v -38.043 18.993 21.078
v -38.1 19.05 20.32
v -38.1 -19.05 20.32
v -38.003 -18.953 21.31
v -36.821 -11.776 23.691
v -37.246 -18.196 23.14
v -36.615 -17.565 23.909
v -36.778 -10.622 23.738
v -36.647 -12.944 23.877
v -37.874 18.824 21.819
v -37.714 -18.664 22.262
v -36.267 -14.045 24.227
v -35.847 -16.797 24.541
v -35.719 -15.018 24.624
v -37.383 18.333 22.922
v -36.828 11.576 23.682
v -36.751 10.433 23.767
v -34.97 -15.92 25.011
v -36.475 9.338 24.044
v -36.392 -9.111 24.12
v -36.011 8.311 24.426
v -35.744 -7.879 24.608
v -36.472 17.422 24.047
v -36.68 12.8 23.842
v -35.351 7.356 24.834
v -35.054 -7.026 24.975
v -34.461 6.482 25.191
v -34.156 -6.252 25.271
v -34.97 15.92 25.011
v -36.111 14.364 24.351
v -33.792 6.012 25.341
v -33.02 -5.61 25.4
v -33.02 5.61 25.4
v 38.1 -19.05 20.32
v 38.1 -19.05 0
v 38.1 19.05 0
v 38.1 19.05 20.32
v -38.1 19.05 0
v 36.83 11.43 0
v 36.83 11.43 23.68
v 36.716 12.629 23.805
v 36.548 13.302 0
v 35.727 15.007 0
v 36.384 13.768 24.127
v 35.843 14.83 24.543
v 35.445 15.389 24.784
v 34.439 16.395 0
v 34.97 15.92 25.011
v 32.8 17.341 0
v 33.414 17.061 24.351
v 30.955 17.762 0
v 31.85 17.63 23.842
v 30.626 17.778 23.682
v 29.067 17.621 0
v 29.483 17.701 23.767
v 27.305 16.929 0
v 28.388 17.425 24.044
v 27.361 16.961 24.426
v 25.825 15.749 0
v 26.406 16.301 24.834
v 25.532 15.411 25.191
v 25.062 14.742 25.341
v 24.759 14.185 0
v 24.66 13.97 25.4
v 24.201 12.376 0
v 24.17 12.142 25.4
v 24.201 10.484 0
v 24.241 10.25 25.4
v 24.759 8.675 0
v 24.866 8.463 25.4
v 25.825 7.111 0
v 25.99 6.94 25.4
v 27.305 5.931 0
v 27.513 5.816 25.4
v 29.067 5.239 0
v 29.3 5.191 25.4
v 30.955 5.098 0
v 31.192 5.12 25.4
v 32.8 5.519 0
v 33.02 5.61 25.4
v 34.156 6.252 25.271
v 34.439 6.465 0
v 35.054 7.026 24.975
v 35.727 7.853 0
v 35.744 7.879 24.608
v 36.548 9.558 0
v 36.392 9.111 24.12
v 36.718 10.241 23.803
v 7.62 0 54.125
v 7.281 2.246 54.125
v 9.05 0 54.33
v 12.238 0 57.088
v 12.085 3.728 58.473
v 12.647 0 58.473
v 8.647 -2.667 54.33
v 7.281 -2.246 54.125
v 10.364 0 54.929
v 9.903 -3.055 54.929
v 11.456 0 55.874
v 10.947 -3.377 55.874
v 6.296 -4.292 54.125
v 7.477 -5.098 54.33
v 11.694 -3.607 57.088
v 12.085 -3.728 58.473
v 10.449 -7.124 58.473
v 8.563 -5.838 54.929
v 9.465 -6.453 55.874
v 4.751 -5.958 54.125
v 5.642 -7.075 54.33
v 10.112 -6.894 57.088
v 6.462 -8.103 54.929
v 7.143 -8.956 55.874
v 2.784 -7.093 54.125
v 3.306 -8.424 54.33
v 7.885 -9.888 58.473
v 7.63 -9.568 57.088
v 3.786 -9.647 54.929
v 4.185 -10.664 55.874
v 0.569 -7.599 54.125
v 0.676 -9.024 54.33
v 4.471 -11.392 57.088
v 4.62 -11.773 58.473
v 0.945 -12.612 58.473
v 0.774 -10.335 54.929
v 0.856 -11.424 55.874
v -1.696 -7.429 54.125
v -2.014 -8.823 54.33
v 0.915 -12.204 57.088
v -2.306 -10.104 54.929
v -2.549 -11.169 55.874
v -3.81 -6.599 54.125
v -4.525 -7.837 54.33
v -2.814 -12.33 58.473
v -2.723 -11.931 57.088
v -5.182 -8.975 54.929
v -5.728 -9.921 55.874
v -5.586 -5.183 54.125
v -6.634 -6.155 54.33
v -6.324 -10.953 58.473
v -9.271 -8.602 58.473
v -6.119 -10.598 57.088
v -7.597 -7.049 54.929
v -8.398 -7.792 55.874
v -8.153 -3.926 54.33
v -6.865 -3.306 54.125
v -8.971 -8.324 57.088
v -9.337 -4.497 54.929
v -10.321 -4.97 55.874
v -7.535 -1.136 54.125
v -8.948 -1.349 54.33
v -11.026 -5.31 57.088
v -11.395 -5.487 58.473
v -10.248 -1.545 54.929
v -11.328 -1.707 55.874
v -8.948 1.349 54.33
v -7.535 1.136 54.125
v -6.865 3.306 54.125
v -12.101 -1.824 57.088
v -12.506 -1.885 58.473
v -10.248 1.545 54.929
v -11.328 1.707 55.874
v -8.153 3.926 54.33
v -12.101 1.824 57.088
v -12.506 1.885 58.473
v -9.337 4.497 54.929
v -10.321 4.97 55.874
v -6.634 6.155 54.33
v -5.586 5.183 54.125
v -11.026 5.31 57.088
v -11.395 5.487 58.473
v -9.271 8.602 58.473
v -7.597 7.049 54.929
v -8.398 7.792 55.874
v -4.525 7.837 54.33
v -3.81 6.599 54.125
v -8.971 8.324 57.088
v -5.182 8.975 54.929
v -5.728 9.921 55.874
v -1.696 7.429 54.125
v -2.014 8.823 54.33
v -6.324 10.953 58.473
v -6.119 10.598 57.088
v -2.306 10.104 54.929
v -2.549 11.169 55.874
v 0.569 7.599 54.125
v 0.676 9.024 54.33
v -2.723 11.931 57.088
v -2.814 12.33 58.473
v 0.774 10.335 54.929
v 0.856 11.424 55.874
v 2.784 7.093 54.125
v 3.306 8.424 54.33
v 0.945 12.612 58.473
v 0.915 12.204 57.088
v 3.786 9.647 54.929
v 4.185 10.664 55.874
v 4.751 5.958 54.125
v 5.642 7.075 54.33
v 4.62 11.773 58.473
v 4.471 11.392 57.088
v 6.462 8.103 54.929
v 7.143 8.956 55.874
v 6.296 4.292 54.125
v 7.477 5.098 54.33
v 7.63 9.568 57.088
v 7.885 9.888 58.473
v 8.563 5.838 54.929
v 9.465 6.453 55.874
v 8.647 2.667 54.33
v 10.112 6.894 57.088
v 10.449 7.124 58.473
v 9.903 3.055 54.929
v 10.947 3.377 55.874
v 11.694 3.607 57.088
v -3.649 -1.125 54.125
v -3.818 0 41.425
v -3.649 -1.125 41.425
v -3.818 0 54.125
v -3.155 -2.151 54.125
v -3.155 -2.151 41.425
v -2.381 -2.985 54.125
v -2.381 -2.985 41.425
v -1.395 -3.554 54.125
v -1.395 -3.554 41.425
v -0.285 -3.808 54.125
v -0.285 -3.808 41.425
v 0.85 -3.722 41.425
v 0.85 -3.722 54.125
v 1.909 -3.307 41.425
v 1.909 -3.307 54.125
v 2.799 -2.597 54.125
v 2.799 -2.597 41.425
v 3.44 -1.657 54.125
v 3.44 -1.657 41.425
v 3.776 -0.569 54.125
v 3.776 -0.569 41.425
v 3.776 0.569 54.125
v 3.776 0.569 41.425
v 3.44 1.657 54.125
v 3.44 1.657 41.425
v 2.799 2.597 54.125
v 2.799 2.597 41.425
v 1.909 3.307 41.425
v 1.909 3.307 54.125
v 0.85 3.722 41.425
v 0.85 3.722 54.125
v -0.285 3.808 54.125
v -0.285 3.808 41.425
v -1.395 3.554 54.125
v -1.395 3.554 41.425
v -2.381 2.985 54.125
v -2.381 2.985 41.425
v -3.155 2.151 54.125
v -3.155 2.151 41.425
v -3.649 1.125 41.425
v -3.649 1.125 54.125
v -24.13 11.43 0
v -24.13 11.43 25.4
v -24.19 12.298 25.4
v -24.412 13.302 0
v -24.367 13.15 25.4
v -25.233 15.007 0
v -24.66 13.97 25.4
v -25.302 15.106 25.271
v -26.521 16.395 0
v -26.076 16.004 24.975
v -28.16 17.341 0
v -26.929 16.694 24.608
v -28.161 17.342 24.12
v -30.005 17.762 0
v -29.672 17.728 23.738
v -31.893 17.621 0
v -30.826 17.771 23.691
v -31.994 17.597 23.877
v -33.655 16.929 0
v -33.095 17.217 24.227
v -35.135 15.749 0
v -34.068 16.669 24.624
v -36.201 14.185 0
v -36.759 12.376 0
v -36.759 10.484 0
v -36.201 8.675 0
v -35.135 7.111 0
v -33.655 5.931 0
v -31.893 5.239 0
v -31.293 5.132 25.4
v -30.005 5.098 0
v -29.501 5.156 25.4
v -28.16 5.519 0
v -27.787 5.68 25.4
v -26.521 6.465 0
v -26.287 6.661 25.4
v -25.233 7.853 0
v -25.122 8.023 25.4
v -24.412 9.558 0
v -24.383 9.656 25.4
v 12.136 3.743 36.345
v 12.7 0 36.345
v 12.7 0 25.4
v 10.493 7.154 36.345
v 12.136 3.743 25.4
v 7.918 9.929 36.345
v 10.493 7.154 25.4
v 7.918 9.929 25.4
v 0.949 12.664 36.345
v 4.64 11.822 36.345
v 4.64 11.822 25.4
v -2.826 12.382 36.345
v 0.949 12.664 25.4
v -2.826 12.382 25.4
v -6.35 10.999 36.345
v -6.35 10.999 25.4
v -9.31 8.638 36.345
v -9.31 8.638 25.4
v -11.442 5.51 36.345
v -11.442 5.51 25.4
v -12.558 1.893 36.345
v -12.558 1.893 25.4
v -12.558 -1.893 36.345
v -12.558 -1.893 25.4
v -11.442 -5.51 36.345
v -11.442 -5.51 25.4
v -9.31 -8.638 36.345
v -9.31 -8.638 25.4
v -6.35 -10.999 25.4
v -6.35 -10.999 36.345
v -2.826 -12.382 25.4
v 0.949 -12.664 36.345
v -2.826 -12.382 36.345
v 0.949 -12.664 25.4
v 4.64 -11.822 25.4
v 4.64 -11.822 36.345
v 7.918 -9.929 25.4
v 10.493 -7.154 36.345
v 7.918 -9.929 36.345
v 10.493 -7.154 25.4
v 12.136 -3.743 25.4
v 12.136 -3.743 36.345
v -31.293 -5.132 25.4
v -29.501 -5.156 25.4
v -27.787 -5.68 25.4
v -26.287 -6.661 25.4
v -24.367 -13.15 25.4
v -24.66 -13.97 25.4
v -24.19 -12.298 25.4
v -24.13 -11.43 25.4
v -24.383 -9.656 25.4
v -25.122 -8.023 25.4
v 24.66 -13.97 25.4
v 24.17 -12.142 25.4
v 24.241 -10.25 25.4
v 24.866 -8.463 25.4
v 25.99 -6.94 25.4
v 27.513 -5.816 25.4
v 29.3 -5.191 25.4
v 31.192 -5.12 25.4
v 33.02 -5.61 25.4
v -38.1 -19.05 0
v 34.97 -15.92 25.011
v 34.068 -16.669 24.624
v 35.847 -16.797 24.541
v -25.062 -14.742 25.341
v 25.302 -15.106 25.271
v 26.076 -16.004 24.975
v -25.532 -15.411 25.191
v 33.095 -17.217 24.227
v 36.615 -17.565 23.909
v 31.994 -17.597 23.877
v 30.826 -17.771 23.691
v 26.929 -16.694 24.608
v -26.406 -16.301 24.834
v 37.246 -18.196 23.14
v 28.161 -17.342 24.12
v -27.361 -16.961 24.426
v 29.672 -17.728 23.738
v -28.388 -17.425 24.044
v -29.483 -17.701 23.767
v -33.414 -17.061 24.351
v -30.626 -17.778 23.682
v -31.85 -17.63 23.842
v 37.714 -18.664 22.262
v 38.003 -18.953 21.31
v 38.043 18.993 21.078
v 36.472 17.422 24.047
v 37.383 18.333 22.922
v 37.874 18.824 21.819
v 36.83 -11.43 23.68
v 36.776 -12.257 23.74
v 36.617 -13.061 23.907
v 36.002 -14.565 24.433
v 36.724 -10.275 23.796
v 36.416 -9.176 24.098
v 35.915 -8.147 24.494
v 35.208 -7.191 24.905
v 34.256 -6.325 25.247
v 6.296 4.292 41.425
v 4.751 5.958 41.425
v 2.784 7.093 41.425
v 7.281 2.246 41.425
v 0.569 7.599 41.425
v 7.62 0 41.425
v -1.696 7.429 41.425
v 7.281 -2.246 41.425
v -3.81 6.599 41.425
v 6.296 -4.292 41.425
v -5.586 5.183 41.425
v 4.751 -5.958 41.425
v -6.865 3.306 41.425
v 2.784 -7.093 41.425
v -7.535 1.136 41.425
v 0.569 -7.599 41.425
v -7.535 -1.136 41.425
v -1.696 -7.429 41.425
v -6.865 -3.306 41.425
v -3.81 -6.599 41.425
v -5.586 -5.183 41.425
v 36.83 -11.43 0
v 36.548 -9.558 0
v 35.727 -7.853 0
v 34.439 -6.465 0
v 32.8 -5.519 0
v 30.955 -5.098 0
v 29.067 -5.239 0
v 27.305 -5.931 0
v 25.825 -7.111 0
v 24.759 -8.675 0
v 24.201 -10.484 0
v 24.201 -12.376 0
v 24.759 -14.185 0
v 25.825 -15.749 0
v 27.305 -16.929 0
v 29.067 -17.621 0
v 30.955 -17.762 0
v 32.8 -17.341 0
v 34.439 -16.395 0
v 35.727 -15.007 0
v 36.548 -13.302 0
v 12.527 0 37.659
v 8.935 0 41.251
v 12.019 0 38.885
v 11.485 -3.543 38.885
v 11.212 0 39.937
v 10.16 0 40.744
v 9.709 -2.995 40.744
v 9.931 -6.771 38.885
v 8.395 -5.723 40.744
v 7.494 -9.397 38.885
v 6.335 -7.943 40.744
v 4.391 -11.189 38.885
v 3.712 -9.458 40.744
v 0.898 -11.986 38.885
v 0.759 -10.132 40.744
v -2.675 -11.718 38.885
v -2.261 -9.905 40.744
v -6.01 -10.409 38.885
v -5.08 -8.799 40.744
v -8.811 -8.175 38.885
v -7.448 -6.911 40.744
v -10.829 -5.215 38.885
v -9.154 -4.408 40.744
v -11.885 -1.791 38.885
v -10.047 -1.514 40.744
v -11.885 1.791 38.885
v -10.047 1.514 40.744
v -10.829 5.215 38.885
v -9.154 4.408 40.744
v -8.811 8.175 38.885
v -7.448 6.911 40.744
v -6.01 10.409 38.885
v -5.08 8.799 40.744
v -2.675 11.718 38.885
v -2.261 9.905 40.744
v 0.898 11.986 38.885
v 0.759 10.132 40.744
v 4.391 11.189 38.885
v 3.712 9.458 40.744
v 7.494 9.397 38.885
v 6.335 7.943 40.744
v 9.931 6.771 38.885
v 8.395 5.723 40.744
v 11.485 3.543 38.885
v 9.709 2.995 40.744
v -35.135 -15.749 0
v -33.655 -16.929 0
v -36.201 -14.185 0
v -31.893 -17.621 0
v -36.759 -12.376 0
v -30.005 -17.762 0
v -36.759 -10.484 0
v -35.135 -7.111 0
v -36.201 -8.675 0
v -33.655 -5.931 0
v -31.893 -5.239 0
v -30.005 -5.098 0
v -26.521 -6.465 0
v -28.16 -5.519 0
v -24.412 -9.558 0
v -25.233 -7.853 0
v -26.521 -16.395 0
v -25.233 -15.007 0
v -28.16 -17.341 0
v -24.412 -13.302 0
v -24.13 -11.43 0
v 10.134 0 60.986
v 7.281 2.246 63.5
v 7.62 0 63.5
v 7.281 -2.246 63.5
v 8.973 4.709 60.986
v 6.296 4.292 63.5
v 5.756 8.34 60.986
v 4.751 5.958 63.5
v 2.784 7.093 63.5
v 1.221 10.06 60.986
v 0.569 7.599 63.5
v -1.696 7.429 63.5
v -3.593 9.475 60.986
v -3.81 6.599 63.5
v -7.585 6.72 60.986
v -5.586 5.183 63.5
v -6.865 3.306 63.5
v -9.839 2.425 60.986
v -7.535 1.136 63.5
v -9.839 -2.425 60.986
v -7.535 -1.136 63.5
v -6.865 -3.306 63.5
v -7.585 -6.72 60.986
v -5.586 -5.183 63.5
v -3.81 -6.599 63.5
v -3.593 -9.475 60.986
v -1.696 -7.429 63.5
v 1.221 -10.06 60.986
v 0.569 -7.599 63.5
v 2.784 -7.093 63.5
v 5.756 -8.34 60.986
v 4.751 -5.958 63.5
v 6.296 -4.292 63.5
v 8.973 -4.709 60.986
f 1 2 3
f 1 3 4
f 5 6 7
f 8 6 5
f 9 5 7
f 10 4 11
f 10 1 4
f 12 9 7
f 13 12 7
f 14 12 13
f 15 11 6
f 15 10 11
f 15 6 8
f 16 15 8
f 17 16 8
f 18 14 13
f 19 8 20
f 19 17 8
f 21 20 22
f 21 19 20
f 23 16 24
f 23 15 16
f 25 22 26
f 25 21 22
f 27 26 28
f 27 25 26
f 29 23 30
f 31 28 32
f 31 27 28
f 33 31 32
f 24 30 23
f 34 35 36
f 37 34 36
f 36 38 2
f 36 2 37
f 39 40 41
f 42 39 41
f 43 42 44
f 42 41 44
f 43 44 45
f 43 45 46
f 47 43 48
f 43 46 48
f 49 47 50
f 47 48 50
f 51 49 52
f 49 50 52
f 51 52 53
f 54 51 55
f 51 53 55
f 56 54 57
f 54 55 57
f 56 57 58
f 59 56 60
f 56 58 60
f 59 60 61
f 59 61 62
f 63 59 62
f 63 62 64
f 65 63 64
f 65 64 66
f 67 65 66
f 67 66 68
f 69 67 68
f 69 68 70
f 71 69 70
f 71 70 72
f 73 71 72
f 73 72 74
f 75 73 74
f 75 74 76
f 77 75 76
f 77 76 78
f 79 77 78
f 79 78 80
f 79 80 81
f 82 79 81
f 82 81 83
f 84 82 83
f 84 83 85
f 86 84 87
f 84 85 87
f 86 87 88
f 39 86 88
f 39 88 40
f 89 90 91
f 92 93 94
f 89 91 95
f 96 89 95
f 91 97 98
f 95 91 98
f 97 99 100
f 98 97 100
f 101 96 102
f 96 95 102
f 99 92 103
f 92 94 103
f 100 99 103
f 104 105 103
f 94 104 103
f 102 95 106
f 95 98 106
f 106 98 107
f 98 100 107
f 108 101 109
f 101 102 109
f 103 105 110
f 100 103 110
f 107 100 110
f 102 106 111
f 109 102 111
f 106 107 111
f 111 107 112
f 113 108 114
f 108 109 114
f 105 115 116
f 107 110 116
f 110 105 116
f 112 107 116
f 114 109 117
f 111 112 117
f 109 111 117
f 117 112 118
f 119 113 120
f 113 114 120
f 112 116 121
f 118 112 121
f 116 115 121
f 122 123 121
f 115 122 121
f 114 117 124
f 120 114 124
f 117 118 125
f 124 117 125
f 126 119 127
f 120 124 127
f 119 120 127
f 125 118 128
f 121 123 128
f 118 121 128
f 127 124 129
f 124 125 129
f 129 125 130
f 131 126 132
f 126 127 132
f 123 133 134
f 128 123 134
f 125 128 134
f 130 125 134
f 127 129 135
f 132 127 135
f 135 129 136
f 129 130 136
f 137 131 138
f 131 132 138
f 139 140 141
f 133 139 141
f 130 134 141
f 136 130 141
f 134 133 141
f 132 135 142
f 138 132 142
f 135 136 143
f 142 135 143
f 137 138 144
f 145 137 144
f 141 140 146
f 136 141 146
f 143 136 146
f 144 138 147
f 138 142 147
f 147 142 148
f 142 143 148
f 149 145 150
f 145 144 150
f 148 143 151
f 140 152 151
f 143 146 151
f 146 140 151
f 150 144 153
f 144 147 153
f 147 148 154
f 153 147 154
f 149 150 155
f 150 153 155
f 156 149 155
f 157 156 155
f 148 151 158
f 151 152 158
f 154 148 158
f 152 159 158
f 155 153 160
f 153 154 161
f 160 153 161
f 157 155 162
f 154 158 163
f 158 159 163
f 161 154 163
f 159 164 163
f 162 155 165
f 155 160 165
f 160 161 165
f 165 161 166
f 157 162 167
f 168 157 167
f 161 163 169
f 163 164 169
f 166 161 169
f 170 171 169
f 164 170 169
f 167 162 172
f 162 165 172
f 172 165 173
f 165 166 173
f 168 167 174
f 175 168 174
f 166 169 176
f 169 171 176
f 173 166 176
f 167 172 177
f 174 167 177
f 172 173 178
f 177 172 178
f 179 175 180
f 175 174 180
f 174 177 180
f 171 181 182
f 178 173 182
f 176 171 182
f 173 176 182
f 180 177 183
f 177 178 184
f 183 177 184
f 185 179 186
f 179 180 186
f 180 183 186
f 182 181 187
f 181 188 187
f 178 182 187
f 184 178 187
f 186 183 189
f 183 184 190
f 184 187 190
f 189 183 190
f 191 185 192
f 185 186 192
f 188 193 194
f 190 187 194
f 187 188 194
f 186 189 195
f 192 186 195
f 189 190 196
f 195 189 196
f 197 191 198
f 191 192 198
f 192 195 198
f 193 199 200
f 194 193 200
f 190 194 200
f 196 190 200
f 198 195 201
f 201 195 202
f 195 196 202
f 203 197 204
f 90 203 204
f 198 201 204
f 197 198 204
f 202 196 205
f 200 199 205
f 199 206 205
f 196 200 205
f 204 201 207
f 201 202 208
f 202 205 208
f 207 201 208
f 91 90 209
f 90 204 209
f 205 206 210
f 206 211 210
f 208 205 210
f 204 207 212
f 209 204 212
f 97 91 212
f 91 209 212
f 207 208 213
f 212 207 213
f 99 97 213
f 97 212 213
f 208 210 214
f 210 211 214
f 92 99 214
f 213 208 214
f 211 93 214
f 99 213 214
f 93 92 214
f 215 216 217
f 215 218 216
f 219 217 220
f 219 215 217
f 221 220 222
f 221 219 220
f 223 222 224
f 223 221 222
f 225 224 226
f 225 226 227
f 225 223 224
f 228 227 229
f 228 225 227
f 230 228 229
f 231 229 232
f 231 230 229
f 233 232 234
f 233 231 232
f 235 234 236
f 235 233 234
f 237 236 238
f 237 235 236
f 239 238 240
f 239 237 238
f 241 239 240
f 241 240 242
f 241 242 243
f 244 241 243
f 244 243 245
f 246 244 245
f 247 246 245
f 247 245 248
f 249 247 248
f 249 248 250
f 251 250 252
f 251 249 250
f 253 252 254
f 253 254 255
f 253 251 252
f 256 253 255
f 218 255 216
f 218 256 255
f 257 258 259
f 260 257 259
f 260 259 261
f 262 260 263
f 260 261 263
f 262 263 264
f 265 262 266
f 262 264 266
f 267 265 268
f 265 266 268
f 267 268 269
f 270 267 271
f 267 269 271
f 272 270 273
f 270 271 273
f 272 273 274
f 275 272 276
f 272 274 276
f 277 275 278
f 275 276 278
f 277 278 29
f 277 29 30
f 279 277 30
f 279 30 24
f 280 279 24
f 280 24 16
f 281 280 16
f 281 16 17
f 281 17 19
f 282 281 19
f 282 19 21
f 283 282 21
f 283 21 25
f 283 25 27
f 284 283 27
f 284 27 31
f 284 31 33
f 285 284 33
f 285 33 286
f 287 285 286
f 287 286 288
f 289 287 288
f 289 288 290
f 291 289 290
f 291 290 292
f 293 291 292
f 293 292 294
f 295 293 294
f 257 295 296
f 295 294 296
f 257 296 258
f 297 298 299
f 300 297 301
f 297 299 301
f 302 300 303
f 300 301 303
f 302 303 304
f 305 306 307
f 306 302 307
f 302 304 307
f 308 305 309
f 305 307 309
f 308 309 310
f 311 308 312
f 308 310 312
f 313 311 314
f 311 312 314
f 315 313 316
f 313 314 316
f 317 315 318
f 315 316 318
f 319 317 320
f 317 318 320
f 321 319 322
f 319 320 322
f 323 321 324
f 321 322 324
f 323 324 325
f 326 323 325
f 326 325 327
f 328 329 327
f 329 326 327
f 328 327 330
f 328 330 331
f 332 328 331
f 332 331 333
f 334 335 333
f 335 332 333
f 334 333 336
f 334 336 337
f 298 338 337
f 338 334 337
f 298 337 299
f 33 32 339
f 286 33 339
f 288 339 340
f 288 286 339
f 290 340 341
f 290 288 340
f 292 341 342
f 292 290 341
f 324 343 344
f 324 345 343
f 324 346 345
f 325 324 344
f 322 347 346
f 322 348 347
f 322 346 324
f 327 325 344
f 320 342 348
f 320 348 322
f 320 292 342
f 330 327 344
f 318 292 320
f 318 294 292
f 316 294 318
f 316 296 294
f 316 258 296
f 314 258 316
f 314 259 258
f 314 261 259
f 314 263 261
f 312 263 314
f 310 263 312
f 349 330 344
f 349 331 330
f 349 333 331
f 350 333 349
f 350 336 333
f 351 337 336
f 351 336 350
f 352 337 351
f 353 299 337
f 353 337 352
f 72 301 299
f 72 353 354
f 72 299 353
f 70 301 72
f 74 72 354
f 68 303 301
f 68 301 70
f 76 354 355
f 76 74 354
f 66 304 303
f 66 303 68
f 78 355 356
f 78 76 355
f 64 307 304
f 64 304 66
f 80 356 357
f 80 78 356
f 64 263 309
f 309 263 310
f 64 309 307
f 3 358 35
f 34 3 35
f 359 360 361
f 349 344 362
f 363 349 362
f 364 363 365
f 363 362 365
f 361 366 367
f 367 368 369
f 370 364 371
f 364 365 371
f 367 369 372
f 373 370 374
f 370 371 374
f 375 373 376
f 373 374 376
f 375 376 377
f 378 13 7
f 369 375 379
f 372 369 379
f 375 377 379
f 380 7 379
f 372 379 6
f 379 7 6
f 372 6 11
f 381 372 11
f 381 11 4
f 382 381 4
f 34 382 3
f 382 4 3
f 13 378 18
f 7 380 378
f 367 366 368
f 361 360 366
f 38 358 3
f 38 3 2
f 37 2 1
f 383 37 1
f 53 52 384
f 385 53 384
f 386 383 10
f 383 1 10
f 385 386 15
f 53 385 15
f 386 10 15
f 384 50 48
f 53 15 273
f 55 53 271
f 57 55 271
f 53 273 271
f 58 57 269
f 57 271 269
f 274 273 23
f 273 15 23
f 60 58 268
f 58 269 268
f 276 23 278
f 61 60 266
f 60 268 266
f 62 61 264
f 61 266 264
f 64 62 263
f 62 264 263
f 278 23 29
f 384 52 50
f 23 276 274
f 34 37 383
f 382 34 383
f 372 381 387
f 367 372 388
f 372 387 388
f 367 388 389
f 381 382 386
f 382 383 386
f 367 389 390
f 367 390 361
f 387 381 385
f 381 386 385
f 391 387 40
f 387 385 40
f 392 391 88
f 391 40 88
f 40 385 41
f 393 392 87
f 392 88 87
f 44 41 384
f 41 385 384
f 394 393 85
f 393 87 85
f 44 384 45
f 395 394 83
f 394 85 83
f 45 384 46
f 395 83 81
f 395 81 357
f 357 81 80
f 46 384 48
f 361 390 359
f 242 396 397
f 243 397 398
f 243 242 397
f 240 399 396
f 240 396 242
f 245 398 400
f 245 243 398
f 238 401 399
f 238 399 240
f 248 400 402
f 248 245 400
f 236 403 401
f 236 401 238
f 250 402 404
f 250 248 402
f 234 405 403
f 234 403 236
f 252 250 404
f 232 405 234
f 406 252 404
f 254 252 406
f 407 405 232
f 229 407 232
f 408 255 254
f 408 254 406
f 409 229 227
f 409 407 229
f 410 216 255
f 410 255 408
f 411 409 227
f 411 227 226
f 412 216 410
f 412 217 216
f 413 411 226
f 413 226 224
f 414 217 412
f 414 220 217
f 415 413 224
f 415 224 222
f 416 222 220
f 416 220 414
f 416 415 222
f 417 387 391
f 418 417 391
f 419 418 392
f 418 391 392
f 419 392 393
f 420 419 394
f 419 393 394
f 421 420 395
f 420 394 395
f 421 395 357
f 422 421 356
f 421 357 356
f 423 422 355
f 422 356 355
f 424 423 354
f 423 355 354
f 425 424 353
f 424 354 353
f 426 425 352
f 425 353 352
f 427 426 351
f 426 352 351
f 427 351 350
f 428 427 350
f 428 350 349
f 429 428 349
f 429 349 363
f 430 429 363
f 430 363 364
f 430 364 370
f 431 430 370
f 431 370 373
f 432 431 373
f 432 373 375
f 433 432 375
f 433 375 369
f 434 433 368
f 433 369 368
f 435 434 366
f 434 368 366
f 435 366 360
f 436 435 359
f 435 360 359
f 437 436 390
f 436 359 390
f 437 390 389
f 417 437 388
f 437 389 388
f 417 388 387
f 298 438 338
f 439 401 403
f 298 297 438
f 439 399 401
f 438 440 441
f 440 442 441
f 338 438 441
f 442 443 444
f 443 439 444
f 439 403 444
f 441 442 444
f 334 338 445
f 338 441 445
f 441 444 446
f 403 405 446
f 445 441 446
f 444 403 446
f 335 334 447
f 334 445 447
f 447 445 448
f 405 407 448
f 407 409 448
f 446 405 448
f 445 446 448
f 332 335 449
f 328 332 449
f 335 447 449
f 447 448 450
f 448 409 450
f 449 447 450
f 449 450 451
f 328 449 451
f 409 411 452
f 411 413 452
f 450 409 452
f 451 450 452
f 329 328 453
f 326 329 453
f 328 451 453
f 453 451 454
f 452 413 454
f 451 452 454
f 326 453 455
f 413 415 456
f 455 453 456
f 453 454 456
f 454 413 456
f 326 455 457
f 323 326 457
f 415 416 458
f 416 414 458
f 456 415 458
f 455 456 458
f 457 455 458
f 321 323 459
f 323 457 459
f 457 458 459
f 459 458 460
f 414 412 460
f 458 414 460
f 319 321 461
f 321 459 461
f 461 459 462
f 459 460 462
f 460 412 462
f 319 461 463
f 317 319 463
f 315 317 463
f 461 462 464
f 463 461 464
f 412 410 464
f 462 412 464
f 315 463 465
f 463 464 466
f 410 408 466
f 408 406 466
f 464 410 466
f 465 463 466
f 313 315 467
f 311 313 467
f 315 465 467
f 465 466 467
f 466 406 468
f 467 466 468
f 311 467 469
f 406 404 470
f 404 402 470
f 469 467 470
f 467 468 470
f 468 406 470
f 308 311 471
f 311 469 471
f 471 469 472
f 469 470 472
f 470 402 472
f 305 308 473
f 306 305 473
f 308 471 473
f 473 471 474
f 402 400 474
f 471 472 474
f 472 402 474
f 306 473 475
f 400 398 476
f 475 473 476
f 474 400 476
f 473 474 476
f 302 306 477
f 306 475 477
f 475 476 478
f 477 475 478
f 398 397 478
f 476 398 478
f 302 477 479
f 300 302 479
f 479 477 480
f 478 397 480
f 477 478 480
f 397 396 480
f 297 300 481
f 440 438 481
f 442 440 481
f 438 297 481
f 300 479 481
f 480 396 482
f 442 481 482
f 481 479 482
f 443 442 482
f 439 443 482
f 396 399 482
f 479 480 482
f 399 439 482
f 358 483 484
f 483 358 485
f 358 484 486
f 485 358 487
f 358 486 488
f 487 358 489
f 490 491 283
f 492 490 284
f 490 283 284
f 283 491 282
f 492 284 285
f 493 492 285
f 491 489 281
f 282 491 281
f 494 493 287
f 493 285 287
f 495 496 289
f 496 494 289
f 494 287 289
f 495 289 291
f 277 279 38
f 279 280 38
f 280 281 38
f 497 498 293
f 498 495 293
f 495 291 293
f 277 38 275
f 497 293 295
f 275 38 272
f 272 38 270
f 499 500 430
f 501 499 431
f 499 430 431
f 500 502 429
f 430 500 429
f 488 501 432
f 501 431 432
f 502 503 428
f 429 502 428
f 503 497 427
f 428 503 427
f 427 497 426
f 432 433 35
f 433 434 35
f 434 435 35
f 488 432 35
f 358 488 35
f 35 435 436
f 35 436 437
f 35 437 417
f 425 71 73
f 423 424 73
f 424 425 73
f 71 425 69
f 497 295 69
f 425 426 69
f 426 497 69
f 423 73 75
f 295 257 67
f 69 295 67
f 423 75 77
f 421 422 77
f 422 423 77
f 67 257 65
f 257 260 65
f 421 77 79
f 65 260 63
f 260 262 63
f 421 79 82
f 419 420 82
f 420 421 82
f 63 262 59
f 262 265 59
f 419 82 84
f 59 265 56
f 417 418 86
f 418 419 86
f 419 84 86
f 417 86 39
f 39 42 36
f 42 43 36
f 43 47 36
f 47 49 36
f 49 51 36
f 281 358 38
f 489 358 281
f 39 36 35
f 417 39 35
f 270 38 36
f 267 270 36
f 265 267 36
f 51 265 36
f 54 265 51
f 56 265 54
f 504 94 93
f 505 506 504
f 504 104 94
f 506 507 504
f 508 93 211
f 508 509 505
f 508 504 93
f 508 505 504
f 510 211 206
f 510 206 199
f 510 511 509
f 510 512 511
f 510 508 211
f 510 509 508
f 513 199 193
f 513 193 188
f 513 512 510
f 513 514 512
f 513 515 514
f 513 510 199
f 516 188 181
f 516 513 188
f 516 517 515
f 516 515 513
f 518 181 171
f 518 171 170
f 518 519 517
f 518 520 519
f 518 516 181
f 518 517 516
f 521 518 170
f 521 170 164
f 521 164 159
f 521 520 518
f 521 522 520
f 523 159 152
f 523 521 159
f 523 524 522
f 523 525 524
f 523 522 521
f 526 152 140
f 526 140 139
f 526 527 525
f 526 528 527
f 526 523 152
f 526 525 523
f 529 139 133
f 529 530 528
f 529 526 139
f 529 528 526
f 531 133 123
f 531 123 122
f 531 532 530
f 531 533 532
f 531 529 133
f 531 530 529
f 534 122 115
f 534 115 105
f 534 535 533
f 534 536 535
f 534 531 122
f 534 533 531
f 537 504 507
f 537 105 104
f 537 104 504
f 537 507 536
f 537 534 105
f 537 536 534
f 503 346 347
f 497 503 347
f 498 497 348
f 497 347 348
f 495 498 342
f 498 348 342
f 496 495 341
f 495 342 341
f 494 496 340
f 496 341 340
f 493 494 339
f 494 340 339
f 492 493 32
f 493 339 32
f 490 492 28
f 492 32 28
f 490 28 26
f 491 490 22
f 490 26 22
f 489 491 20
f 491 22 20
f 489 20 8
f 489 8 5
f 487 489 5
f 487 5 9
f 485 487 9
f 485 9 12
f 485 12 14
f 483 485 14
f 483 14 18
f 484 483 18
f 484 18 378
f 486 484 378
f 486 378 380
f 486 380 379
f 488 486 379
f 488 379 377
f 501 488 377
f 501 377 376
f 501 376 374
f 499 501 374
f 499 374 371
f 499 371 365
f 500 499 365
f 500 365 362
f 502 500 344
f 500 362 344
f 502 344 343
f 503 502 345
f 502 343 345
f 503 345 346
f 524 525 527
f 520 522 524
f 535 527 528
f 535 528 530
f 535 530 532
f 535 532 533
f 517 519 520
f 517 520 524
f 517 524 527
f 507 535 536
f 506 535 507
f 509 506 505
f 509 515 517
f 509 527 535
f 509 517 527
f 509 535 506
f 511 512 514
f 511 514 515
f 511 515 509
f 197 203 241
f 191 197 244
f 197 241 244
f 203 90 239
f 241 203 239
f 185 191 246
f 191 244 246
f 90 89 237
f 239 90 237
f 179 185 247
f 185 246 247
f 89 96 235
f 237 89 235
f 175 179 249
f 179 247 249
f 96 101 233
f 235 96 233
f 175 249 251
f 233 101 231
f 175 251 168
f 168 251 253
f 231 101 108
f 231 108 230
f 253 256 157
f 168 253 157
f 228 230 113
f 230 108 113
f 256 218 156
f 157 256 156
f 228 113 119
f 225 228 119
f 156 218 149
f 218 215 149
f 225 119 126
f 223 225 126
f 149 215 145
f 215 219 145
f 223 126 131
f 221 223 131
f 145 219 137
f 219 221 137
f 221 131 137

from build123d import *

# Parameters (mm, degrees)
F0_W        = 76.2
F0_H        = 38.1
F1_DEPTH    = 25.4
F2_R        = 6.35
F3_DEPTH    = 25.4
F4_R        = 12.7
F5_DEPTH    = 38.1
F6_W        = 12.7
F6_H        = 12.7
F8_T1_DEPTH = 101.6
F8_T3_DEPTH = 63.5


# Not quite as in the source:
# - a fillet or chamfer that OpenCascade refuses, or shapes differently, is made with other operations: its cross-section is extruded or revolved along the edge and cut away or added


with BuildPart() as f1:
    # F0 (on Top) → F1 (new body)
    with BuildSketch(Plane.XY):
        Rectangle(F0_W, F0_H)
    extrude(amount=F1_DEPTH)

    # F2 (on face) → F3 (cut)
    with BuildSketch(Plane.XY.offset(25.4)):
        with Locations((-30.48, 11.43)):
            Circle(F2_R)
        with Locations((-30.48, -11.43)):
            Circle(F2_R)
        with Locations((30.48, 11.43)):
            Circle(F2_R)
        with Locations((30.48, -11.43)):
            Circle(F2_R)
    extrude(amount=-F3_DEPTH, mode=Mode.SUBTRACT)

    # F4 (on face) → F5 (join)
    with BuildSketch(Plane.XY.offset(25.4)):
        Circle(F4_R)
    extrude(amount=F5_DEPTH)

    # F6 (on Front) → F7 (revolve, cut)
    with BuildSketch(Plane.XZ):
        with Locations((-10.1681923658, 47.7745333523)):
            Rectangle(F6_W, F6_H)
    revolve(axis=Axis((0, 0, 63.5), (0, 0, 1)), mode=Mode.SUBTRACT)

    # F8: fillet of radius 5.08 on 6 edges, made by hand

    # F8_s2 → F8_t1 (cut)
    with BuildSketch(Plane.YZ.offset(-50.8)):
        with BuildLine():
            ThreePointArc((-13.97, 25.4), (-17.5621024484, 23.9121024484), (-19.05, 20.32))
            Line((-19.05, 20.32), (-19.05, 25.4))
            Line((-19.05, 25.4), (-13.97, 25.4))
        make_face()
        with BuildLine():
            ThreePointArc((19.05, 20.32), (17.5621024484, 23.9121024484), (13.97, 25.4))
            Line((13.97, 25.4), (19.05, 25.4))
            Line((19.05, 25.4), (19.05, 20.32))
        make_face()
    extrude(amount=F8_T1_DEPTH, mode=Mode.SUBTRACT)

    # F8_s4 → F8_t3 (cut)
    with BuildSketch(Plane.XZ.offset(-31.75)):
        with BuildLine():
            ThreePointArc((-38.1, 20.32), (-36.6121024484, 23.9121024484), (-33.02, 25.4))
            Line((-33.02, 25.4), (-38.1, 25.4))
            Line((-38.1, 25.4), (-38.1, 20.32))
        make_face()
        with BuildLine():
            ThreePointArc((38.1, 20.32), (36.6121024484, 23.9121024484), (33.02, 25.4))
            Line((33.02, 25.4), (38.1, 25.4))
            Line((38.1, 25.4), (38.1, 20.32))
        make_face()
    extrude(amount=F8_T3_DEPTH, mode=Mode.SUBTRACT)

    # F8_s5 → F8_t6 (revolve, cut)
    with BuildSketch(Plane.XZ):
        with BuildLine():
            ThreePointArc((12.7, 36.3445333523), (11.2121024484, 39.9366358007), (7.62, 41.4245333523))
            Line((7.62, 41.4245333523), (12.7, 41.4245333523))
            Line((12.7, 41.4245333523), (12.7, 36.3445333523))
        make_face()
    revolve(axis=Axis((0, 0, 41.4245333523), (0, 0, -1)), mode=Mode.SUBTRACT)

    # F8_s7 → F8_t8 (revolve, cut)
    with BuildSketch(Plane.XZ):
        with BuildLine():
            ThreePointArc((7.62, 54.1245333523), (11.2121024484, 55.6124309038), (12.7, 59.2045333523))
            Line((12.7, 59.2045333523), (12.7, 54.1245333523))
            Line((12.7, 54.1245333523), (7.62, 54.1245333523))
        make_face()
    revolve(axis=Axis((0, 0, 54.1245333523), (0, 0, -1)), mode=Mode.SUBTRACT)

    # F9: chamfer of 5.08 on 1 edges, made by hand

    # F9_s1 → F9_t2 (revolve, cut)
    with BuildSketch(Plane.XZ):
        Polygon((12.7, 58.42), (7.62, 63.5), (12.7, 63.5), align=None)
    revolve(axis=Axis((0, 0, 63.5), (0, 0, 1)), mode=Mode.SUBTRACT)


solid = f1.part
